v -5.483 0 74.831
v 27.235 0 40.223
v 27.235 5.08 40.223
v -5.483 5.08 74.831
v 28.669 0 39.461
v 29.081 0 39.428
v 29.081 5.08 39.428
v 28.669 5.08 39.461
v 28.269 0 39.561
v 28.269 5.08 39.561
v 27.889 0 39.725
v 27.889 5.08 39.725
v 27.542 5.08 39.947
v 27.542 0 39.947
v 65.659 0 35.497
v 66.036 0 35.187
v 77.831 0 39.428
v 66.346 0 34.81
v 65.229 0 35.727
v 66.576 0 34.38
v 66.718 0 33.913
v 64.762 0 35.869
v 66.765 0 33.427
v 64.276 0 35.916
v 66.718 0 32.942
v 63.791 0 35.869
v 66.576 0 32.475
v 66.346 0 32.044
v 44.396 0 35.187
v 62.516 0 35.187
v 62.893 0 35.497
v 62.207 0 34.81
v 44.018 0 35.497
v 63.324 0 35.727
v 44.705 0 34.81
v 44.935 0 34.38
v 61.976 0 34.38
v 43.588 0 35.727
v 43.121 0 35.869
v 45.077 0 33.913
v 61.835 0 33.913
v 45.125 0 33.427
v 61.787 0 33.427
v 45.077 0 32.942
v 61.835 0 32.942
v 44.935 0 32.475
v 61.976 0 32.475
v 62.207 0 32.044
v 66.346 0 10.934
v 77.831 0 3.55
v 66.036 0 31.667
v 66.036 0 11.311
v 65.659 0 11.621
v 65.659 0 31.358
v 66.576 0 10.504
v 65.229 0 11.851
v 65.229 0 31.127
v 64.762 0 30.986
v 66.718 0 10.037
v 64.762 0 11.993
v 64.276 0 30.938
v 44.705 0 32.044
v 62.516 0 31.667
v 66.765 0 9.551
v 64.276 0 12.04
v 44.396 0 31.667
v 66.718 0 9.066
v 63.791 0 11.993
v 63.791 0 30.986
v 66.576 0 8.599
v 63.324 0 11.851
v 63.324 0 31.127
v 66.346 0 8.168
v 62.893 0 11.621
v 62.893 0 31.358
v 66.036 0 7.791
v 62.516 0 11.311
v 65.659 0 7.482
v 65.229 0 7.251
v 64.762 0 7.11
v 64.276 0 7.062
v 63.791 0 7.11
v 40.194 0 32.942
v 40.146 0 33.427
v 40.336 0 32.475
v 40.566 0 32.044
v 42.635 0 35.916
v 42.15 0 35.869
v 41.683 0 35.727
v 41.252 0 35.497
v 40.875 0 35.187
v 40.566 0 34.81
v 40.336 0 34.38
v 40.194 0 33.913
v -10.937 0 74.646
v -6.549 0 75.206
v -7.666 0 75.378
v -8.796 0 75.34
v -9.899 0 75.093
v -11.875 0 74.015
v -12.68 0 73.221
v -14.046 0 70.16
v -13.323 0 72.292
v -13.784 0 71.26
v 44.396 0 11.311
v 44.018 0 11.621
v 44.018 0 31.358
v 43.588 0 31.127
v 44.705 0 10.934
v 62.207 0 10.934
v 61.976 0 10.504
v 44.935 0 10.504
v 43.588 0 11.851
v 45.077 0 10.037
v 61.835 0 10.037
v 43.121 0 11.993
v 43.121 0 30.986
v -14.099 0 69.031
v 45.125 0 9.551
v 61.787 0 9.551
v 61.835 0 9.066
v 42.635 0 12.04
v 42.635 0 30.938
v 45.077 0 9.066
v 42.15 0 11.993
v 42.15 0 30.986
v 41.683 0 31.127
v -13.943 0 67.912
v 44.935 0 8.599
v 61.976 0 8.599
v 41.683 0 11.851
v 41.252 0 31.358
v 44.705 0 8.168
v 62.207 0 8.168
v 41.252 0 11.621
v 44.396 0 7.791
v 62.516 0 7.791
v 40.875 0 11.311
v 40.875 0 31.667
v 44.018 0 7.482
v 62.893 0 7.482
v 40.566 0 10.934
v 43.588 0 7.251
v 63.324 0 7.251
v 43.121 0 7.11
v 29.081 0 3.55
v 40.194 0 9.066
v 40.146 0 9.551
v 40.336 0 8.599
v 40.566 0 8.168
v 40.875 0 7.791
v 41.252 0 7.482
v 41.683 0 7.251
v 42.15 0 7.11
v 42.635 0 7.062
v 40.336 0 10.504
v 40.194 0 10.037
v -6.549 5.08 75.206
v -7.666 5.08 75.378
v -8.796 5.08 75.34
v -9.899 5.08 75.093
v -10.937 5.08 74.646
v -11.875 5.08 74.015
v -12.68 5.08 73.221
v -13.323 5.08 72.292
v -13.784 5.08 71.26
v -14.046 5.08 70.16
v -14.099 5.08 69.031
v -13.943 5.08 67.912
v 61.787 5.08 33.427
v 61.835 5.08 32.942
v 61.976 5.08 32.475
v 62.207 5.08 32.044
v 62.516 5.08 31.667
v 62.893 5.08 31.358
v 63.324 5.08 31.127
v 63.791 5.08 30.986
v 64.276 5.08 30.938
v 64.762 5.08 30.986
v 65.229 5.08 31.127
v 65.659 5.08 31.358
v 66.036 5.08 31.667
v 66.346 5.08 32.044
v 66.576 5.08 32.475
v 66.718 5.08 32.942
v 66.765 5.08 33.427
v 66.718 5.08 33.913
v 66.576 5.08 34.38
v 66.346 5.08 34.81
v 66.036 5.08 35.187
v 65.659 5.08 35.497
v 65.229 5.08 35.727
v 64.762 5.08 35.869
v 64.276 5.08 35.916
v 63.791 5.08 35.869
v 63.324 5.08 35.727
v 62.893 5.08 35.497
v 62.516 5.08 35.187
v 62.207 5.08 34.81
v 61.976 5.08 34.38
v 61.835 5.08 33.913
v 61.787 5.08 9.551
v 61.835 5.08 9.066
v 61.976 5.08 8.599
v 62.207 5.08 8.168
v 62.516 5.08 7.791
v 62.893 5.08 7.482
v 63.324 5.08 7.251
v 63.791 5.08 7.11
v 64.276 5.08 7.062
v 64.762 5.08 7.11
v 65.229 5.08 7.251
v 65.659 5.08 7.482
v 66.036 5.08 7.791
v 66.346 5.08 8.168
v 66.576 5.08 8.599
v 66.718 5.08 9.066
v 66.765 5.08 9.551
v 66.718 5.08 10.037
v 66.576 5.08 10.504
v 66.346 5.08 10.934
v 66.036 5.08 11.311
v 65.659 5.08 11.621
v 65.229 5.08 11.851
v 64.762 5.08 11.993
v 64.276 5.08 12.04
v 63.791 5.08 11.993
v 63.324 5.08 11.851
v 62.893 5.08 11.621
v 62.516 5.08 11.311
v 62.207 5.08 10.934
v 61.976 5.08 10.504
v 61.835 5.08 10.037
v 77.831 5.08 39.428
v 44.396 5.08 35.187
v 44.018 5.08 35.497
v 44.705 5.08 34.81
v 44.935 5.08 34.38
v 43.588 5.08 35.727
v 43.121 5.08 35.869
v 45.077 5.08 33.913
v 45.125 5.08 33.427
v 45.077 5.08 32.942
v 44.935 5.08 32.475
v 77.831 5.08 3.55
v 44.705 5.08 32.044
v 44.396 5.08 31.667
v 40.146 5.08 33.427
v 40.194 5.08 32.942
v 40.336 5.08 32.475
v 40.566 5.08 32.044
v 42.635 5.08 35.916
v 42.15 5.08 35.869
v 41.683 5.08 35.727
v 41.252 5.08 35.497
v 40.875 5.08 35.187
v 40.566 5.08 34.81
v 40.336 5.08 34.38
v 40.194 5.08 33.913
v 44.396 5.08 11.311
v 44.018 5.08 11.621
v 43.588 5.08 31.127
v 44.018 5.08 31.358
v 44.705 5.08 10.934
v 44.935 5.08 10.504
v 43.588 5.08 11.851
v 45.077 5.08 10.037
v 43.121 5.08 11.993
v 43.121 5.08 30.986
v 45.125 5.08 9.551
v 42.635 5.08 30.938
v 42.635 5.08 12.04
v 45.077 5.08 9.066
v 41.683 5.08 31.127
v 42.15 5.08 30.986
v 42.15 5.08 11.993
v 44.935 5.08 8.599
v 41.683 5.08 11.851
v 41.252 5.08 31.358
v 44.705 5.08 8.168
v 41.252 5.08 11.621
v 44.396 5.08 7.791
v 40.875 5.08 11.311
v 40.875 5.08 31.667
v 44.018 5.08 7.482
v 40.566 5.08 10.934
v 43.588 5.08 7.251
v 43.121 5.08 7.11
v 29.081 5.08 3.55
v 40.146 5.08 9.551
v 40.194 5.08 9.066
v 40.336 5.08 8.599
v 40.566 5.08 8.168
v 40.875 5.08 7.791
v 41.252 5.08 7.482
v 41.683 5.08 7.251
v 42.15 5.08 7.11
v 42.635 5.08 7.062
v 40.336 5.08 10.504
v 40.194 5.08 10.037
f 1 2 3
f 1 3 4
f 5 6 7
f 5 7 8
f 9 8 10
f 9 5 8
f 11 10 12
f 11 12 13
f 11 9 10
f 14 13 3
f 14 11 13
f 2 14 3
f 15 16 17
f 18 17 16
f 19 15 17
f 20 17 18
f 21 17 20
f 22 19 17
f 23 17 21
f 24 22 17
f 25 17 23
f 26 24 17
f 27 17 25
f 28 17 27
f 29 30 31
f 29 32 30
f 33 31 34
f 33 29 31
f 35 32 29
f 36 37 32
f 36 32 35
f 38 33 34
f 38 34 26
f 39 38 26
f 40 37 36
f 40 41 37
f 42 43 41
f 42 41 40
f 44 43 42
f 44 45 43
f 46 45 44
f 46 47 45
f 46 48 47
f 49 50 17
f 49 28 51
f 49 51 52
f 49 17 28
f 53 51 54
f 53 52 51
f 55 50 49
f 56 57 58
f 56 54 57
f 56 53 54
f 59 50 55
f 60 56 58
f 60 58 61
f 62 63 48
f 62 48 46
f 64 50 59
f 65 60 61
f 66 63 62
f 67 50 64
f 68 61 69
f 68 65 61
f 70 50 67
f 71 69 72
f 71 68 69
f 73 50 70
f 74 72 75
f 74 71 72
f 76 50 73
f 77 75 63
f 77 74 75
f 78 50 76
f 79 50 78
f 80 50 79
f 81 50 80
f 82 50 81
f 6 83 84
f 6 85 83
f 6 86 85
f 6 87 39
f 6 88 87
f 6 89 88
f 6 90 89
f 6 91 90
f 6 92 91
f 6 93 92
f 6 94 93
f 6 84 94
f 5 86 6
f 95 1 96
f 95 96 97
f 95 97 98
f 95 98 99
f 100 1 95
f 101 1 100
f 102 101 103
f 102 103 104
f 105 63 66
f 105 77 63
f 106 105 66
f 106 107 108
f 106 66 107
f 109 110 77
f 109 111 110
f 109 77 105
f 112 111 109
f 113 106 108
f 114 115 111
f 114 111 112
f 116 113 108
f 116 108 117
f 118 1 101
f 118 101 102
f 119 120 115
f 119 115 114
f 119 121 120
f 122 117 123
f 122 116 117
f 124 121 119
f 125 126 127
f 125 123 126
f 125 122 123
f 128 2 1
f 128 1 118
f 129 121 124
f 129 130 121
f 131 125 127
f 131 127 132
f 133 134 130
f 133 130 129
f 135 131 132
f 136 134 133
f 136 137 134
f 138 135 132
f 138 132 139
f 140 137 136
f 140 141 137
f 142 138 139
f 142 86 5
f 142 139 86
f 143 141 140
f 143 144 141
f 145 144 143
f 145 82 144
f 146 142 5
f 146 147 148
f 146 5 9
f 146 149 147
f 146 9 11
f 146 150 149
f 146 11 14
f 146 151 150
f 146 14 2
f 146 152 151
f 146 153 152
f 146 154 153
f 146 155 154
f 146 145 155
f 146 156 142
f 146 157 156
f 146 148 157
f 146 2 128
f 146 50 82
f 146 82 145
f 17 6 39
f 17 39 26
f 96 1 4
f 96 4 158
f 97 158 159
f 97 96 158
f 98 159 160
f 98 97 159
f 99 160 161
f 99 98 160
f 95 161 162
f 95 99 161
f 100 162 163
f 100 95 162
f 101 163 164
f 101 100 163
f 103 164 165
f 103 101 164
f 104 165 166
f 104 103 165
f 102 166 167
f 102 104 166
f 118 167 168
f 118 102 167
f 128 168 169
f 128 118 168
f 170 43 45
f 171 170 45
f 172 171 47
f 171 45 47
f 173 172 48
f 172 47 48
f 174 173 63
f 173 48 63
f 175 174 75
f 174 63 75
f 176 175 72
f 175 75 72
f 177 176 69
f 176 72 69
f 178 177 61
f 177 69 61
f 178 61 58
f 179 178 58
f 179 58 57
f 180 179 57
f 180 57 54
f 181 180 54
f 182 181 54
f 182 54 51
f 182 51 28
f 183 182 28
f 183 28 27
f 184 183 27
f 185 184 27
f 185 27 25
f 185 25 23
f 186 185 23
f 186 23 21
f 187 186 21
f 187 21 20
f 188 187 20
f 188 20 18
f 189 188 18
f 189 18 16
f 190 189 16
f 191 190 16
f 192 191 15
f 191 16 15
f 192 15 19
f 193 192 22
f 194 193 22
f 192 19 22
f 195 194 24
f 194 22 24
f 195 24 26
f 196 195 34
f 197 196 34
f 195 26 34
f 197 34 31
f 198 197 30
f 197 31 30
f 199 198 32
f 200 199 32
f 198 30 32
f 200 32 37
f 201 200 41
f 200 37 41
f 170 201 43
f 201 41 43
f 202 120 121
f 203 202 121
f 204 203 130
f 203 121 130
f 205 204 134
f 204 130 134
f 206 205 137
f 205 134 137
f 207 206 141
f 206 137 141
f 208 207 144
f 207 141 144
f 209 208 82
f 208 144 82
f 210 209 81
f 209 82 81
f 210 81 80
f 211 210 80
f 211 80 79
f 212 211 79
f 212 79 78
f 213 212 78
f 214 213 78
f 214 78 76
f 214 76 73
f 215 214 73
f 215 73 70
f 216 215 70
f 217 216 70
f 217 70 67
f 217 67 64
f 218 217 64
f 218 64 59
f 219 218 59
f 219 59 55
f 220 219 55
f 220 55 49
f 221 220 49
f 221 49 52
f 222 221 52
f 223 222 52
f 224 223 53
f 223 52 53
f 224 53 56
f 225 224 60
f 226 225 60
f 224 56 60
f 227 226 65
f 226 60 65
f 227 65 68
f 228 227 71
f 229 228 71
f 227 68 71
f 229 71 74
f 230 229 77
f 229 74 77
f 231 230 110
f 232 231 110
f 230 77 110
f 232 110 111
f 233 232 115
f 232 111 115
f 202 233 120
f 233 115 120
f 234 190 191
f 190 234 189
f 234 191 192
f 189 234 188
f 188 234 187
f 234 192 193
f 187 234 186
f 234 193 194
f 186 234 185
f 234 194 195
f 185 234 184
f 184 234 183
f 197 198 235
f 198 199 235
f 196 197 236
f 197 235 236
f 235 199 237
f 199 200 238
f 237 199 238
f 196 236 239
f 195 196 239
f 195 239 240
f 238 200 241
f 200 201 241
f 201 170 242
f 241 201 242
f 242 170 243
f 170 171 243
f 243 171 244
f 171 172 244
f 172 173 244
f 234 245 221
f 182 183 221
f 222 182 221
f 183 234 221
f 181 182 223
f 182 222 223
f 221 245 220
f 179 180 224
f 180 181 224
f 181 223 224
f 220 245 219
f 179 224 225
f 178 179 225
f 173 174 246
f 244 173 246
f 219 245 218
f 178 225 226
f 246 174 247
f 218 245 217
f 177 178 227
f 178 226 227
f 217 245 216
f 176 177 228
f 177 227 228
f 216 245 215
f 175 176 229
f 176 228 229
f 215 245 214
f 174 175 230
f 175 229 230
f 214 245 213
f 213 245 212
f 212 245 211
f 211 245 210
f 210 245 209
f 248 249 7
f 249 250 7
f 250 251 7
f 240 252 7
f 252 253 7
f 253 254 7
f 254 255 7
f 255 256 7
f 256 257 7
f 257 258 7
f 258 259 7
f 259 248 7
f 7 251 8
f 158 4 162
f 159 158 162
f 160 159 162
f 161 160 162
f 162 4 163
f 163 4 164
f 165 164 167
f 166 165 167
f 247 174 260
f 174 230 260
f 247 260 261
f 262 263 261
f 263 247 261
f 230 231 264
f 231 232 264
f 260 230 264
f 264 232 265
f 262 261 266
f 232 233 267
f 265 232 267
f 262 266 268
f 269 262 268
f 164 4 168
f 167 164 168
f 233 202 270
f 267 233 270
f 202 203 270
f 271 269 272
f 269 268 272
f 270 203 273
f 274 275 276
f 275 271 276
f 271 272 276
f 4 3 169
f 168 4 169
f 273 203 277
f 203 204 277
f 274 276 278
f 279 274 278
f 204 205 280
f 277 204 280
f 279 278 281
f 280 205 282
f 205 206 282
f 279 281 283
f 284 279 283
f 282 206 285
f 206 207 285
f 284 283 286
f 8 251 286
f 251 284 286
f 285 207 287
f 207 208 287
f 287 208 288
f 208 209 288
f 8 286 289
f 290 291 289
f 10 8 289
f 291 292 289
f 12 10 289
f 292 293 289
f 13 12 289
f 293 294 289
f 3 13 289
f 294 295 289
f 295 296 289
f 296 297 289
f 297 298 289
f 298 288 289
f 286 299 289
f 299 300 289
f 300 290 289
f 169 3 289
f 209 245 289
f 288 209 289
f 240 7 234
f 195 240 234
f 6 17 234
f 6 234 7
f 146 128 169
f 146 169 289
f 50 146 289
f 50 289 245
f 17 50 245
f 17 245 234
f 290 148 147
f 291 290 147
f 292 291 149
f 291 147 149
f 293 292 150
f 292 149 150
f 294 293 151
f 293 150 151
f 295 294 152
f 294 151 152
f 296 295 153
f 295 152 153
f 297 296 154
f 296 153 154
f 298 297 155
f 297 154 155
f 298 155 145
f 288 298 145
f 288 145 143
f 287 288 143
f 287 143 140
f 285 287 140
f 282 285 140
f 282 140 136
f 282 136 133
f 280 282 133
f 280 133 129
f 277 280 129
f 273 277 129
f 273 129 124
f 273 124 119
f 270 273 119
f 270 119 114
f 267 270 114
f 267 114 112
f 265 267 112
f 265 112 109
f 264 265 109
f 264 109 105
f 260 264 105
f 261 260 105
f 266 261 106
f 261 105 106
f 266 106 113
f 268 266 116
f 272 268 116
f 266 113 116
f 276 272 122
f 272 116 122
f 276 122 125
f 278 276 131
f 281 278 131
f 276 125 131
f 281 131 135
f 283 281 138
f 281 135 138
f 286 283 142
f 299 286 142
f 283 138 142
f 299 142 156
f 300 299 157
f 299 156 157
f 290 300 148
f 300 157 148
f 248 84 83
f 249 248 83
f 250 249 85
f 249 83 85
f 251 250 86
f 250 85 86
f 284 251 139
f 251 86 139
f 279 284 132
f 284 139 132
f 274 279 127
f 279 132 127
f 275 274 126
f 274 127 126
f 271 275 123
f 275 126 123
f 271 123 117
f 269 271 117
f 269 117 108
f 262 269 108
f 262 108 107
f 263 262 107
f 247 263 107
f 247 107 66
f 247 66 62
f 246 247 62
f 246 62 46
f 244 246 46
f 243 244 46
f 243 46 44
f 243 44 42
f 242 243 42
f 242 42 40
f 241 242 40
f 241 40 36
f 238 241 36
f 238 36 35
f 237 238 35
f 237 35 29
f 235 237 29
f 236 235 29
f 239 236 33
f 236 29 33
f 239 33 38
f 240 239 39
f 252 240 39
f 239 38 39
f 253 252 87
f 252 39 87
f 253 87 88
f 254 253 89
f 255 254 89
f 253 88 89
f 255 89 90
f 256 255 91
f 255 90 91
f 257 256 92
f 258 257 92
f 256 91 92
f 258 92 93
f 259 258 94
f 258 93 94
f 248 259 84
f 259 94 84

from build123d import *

# Parameters (mm, degrees)
BOSS_EXTRUDE1_DEPTH    = 5.08
F_10_CLEARANCE_HOLE1_D = 4.9784


with BuildPart() as part:
    # Sketch1 → Boss-Extrude1 (new body)
    with BuildSketch(Plane(origin=(0, 0, 0), x_dir=(1, 0, 0), z_dir=(0, 1, 0))):
        with BuildLine():
            Line((27.234807671, -40.223012788), (-5.482691703, -74.830900036))
            ThreePointArc((-5.482691703, -74.830900036), (-11.874952903, -74.014978741), (-13.943081074, -67.911735613))
            Line((-13.943081074, -67.911735613), (29.080561657, -3.550446088))
            Line((29.080561657, -3.550446088), (77.831071682, -3.550446088))
            Line((77.831071682, -3.550446088), (77.831071682, -39.427946088))
            Line((77.831071682, -39.427946088), (29.080561657, -39.427946088))
            ThreePointArc((29.080561657, -39.427946088), (28.075706091, -39.635165496), (27.234807671, -40.223012788))
        make_face()
    extrude(amount=BOSS_EXTRUDE1_DEPTH)

    # #10 Clearance Hole1 (through all)
    with Locations(Plane(origin=(0, 5.08, 0), x_dir=(1, 0, 0), z_dir=(0, 1, 0))):
        with Locations((42.63541667, -33.427196088), (42.63541667, -9.551196088), (64.27621667, -9.551196088), (64.27621667, -33.427196088)):
            Hole(F_10_CLEARANCE_HOLE1_D / 2)


solid = part.part
